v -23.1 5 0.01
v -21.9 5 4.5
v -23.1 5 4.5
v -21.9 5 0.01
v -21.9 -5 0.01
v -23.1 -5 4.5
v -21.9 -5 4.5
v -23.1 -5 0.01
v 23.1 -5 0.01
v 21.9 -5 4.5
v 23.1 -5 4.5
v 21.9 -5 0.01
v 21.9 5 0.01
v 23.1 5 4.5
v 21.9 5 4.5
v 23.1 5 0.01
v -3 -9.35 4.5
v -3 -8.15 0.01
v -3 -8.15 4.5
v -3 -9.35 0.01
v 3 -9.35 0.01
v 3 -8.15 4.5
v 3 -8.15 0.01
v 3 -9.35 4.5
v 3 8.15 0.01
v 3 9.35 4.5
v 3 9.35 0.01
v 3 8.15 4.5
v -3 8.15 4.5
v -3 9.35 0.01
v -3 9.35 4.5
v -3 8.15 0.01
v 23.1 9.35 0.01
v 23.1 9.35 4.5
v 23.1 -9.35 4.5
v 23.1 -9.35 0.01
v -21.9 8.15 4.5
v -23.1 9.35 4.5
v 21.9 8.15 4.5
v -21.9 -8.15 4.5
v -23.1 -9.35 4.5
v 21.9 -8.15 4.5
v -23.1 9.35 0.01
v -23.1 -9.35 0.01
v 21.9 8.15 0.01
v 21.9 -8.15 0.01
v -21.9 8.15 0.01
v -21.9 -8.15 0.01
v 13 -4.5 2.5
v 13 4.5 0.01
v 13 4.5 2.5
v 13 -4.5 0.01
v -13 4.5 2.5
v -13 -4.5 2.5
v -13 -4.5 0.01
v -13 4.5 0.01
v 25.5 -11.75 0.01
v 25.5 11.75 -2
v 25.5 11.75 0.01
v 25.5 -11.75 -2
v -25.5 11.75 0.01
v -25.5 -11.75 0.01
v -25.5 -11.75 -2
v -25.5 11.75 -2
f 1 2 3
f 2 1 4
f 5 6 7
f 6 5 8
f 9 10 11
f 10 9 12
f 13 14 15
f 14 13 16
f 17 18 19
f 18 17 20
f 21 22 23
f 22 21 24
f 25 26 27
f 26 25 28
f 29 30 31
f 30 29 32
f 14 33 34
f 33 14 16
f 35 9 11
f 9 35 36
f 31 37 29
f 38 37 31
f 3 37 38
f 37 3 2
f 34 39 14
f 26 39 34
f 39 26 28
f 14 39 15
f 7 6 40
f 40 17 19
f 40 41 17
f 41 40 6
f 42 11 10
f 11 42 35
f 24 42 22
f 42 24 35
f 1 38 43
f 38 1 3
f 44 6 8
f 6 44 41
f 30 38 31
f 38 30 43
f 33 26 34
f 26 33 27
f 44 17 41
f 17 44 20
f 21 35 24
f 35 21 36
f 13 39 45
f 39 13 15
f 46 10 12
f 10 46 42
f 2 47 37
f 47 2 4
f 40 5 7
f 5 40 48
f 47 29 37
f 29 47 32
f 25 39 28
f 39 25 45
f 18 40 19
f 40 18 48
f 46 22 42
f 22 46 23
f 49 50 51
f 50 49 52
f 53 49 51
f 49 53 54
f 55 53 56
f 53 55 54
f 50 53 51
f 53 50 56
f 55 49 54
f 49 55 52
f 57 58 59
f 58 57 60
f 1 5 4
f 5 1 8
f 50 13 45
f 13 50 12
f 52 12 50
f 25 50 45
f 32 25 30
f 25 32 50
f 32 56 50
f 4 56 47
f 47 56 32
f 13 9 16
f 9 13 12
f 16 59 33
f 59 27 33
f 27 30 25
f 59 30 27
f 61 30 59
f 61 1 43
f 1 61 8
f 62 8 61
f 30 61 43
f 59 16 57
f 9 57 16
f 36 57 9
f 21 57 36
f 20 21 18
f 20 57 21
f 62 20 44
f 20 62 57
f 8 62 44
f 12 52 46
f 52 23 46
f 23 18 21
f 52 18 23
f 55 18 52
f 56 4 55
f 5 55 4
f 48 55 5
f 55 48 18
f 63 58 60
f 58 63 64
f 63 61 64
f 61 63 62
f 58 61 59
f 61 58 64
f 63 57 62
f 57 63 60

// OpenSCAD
// file: ../../board-pocket/board-pocket.scad
//-----------------------------------------------------------------------
// Board pocket: holds a board that has no mounting holes
//
// The board sits on a central pedestal with a pad of double-sided foam tape
// on top, inside a low wall that follows its outline. The pedestal keeps
// the board's edges off the floor, so lead stubs soldered through the edge
// holes have room underneath; gaps in the wall let the leads out. The wall
// only locates the board: the tape holds it down, and in a closed box a lid
// pad presses a pad of foam onto it (boardLidPad below).
//
// Modules, all in the same frame:
//   boardPocketGhost()   the board and its tape, for previews
//   boardPocketHolder()  the plastic: pedestal and outline wall, add to the floor
//   boardLidPad()        a block hanging from the lid that presses foam onto the board
//   boardLidPadGhost()   the foam under it, squashed, for previews
//
// Frame: origin on the floor top, under the centre of the board's outline.
// X along the board's length l, Y across its width w, Z up. Units: mm.
//
// Sides are listed [-X, +X, -Y, +Y], each one of
//   "gap"    wall with a gap in the middle for leads (gapW wide)
//   "solid"  whole wall: use it where the board takes a push (a plug)
//   "open"   no wall: the board's edge goes into a box wall (a USB port)
//
// Used by esp32-c3-supermini, esp32-s3-devkitc and rs485-max485.
//-----------------------------------------------------------------------

//-- From the controller project's receiver.scad / rack-end.scad (boardPocket), 2026-10-30
bpPedestal  = 2.5;     // floor to the tape: room for lead stubs under the board edges
bpTape      = 1.0;     // double-sided foam tape on the pedestal. CAL: how far it squashes
bpWall      = 1.2;     // outline wall thickness
bpRise      = 1.0;     // wall top above the PCB underside (the controller project's rack-end: 0.8 under the S3's module)
bpClearance = 0.4;     // per side, board outline to wall: PETG. 0.3 for PLA. Set by the fit piece
bpGapW      = 6;       // lead gap in a "gap" side
bpPadInset  = 4;       // default pedestal: the board less this all round

//-- Lid hold-down (the controller project's receiver / rack-end lid pads)
bpFoam      = 3.0;     // CAL: self-adhesive foam stuck under each lid pad
bpSqueeze   = 1.0;     // how far the lid squashes it: ~1/3 for soft foam, 0.3 for felt

//-- PCB underside above the floor top
function boardPocketZ(pedestal = bpPedestal, tape = bpTape) = pedestal + tape;
//-- default pedestal [l, w] for a board
function boardPocketPad(l, w, inset = bpPadInset) = [max(l - 2*inset, 4), max(w - 2*inset, 4)];
//-- Z of a lid pad's underside, pressing on a surface at surfaceZ (board top, or a part on it)
function boardLidPadZ(surfaceZ, foam = bpFoam, squeeze = bpSqueeze) =
  assert(squeeze > 0 && squeeze < foam, "foam would not touch the board")
  surfaceZ + foam - squeeze;

function bpSides4(s) = is_list(s) ? s : [s, s, s, s];

module boardPocketGhost(l, w, pcb = 1.6, pad, pedestal = bpPedestal, tape = bpTape)
{
  p = is_undef(pad) ? boardPocketPad(l, w) : pad;
  %color("White") translate([-p[0]/2, -p[1]/2, pedestal]) cube([p[0], p[1], tape]);
  %color("DarkGreen") translate([-l/2, -w/2, pedestal + tape]) cube([l, w, pcb]);
}

//-- pad: pedestal [l, w]; gapW a number or one per side
module boardPocketHolder(l, w, pad, sides = "gap", gapW = bpGapW, clearance = bpClearance,
                         pedestal = bpPedestal, tape = bpTape, wall = bpWall, rise = bpRise)
{
  p   = is_undef(pad) ? boardPocketPad(l, w) : pad;
  s   = bpSides4(sides);
  g   = bpSides4(gapW);
  ix  = l/2 + clearance;                 // inner half sizes
  iy  = w/2 + clearance;
  top = pedestal + tape + rise;
  assert(p[0] <= l && p[1] <= w, "pedestal bigger than the board");
  for (k = s) assert(k == "gap" || k == "solid" || k == "open", str("unknown side ", k));

  //-- pedestal, centred under the board
  translate([-p[0]/2, -p[1]/2, -0.01]) cube([p[0], p[1], pedestal + 0.01]);
  //-- outline wall
  difference()
  {
    translate([-ix - wall, -iy - wall, -0.01]) cube([2*(ix + wall), 2*(iy + wall), top + 0.01]);
    translate([-ix, -iy, -1]) cube([2*ix, 2*iy, top + 2]);
    for (i = [0 : 3])
    {
      //-- each side's cut, drawn for -X then turned into place
      ax = (i < 2) ? ix : iy;         // inner half size across the side
      al = (i < 2) ? iy : ix;         // half length along it
      rotate([0, 0, [0, 180, 90, 270][i]])   // -X, +X, -Y, +Y
      {
        if (s[i] == "gap")
          translate([-ax - wall - 1, -g[i]/2, -1]) cube([wall + 2, g[i], top + 2]);
        if (s[i] == "open")
          translate([-ax - wall - 1, -al - wall - 1, -1]) cube([wall + 1.01, 2*(al + wall + 1), top + 2]);
      }
    }
  }
}

//-- A lid pad over the rectangle size [x, y] centred at `at`, from the squashed foam up to
//-- lidZ (the lid's inner face in this frame), running `into` up into the lid plate
module boardLidPad(size, at = [0, 0], surfaceZ, lidZ, foam = bpFoam, squeeze = bpSqueeze, into = 0.5)
{
  z0 = boardLidPadZ(surfaceZ, foam, squeeze);
  assert(lidZ > z0, "lid is below the pad: the box is too low for the foam");
  translate([at[0] - size[0]/2, at[1] - size[1]/2, z0]) cube([size[0], size[1], lidZ - z0 + into]);
}

module boardLidPadGhost(size, at = [0, 0], surfaceZ, foam = bpFoam, squeeze = bpSqueeze)
{
  %color("Gray") translate([at[0] - size[0]/2, at[1] - size[1]/2, surfaceZ]) cube([size[0], size[1], foam - squeeze]);
}
// file: ../rs485-max485.scad
//-----------------------------------------------------------------------
// TTL-to-RS485 module (MAX485 and friends), on the floor
//
// These modules have no mounting holes. The board sits on a taped pedestal
// inside an outline pocket (board-pocket), with lead gaps at both ends (bus
// end and logic end) and in the long sides. In a closed box two lid pads
// press foam onto it, one inboard of each end's pin row.
//
// Modules, all in the same frame:
//   rs485Ghost()     the board, its chips, pin holes and any screw terminal
//   rs485Holder()    the plastic: pedestal and outline pocket, add to the floor
//   rs485LidPads()   blocks under the lid that press foam onto the board
//
// Frame: origin on the floor top under the centre of the board. X along the
// board, bus end (A/B) at -X, logic end (VCC/TXD/RXD/GND) at +X. Z up. Units: mm.
//
// Sizes: pick a row of rs485Variants by name.
//-----------------------------------------------------------------------

//-- included, not used, so its default values (bpTape, bpClearance...) are in scope here
include <../board-pocket/board-pocket.scad>

//-- [name, length, width, pcb, tallest SMD, bus pins, logic pins, screw terminal [l, w, h] or undef]
rs485Variants = [
  //-- JZK 5-pack B09VGJCJKQ, auto-direction (MAX485 + CD4069). Outline measured 2026-10-21;
  //-- PCB CAL (probably 1.6). Bus end: A+ B- earth, bare holes. Logic: VCC TXD RXD GND
  ["jzk",    43.0, 15.5,  1.6, 2.0, 3, 4, undef],
  //-- XY-017 auto-direction (WINGONEER manual, manuals.plus/asin/B06XHH6B6R): 42.8 x 15.22 x 0.8.
  //-- Looks like the same family as the JZK; pin counts CAL
  ["xy-017", 42.8, 15.22, 0.8, 2.0, 3, 4, undef],
  //-- Classic blue MAX485 module (HW-0519 style): 44 x 14 on most listings (some 45 x 15, 46 x 12),
  //-- 4-pin header each end (RO RE DE DI / VCC B A GND), 2-way 5.08 screw terminal at the bus end.
  //-- PCB, terminal size and its place on the board CAL
  ["max485", 44.0, 14.0,  1.6, 2.0, 4, 4, [7.5, 10.2, 10.0]],
];
rs485Variant  = "jzk";

rs485PinPitch = 2.54;
rs485PinEnd   = 1.5;      // CAL: pin row centre from the board's end
rs485ChipSize = [5.0, 6.0, 1.75];   // SOIC-8, ghost only; placed either side of the middle (CAL)
//-- Holder (the controller project's receiver.scad / rack-end.scad)
rs485PadEnd   = 8.5;      // pedestal stops this far from each end: clear of the pin stubs
rs485PadSide  = 3.25;     // and this far from each long side (26 x 9 on the JZK)
rs485EndGap   = 10;       // lead gap at the ends: the 4-pin row is 7.62 across, plus wire
rs485SideGap  = 6;
rs485PadInset = 6;        // lid pads: this far inboard of each end
rs485PadLen   = 6;

function rs485(name = rs485Variant) = let (i = search([name], rs485Variants)[0])
  assert(i != [] && i != undef, str("unknown RS485 variant ", name)) rs485Variants[i];
function rs485Pad(variant = rs485Variant) = let (v = rs485(variant))
  [v[1] - 2*rs485PadEnd, v[2] - 2*rs485PadSide];
//-- PCB top above the floor
function rs485Top(variant = rs485Variant, pedestal = bpPedestal, tape = bpTape) =
  boardPocketZ(pedestal, tape) + rs485(variant)[3];

module rs485Ghost(variant = rs485Variant, pedestal = bpPedestal, tape = bpTape)
{
  v   = rs485(variant);
  top = rs485Top(variant, pedestal, tape);
  boardPocketGhost(v[1], v[2], v[3], rs485Pad(variant), pedestal, tape);
  for (x = [-1, 1])
    %color("Black") translate([x*5 - rs485ChipSize[0]/2, -rs485ChipSize[1]/2, top]) cube(rs485ChipSize);
  //-- pin rows across each end
  for (e = [[-1, v[5]], [1, v[6]]], i = [0 : e[1] - 1])
    %color("Gold") translate([e[0]*(v[1]/2 - rs485PinEnd), (i - (e[1] - 1)/2)*rs485PinPitch, top - v[3] - 0.01])
      cylinder(d = 1.0, h = v[3] + 0.02, $fn = 12);
  if (!is_undef(v[7]))
    %color("RoyalBlue") translate([-v[1]/2 + 3, -v[7][1]/2, top]) cube(v[7]);
}

module rs485Holder(variant = rs485Variant, sides = "gap", clearance = bpClearance,
                   pedestal = bpPedestal, tape = bpTape, rise = bpRise)
{
  v = rs485(variant);
  boardPocketHolder(v[1], v[2], rs485Pad(variant), sides,
                    [rs485EndGap, rs485EndGap, rs485SideGap, rs485SideGap],
                    clearance, pedestal, tape, bpWall, rise);
}

//-- lidZ: the lid's inner face above the floor top. With a screw terminal, the bus-end pad
//-- moves inboard of it
module rs485LidPads(lidZ, variant = rs485Variant, foam = bpFoam, squeeze = bpSqueeze,
                    pedestal = bpPedestal, tape = bpTape)
{
  v   = rs485(variant);
  top = rs485Top(variant, pedestal, tape);
  busIn = is_undef(v[7]) ? rs485PadInset : 3 + v[7][0] + 1;
  for (x = [-v[1]/2 + busIn + rs485PadLen/2, v[1]/2 - rs485PadInset - rs485PadLen/2])
    boardLidPad([rs485PadLen, v[2] - 3], [x, 0], top, lidZ, foam, squeeze);
}
// main file
// One holder on a piece of floor, for the catalogue.
include <../rs485-max485.scad>

variant = "jzk";
v = rs485(variant);
translate([-v[1]/2 - 4, -v[2]/2 - 4, -2]) cube([v[1] + 8, v[2] + 8, 2.01]);
rs485Holder(variant);
